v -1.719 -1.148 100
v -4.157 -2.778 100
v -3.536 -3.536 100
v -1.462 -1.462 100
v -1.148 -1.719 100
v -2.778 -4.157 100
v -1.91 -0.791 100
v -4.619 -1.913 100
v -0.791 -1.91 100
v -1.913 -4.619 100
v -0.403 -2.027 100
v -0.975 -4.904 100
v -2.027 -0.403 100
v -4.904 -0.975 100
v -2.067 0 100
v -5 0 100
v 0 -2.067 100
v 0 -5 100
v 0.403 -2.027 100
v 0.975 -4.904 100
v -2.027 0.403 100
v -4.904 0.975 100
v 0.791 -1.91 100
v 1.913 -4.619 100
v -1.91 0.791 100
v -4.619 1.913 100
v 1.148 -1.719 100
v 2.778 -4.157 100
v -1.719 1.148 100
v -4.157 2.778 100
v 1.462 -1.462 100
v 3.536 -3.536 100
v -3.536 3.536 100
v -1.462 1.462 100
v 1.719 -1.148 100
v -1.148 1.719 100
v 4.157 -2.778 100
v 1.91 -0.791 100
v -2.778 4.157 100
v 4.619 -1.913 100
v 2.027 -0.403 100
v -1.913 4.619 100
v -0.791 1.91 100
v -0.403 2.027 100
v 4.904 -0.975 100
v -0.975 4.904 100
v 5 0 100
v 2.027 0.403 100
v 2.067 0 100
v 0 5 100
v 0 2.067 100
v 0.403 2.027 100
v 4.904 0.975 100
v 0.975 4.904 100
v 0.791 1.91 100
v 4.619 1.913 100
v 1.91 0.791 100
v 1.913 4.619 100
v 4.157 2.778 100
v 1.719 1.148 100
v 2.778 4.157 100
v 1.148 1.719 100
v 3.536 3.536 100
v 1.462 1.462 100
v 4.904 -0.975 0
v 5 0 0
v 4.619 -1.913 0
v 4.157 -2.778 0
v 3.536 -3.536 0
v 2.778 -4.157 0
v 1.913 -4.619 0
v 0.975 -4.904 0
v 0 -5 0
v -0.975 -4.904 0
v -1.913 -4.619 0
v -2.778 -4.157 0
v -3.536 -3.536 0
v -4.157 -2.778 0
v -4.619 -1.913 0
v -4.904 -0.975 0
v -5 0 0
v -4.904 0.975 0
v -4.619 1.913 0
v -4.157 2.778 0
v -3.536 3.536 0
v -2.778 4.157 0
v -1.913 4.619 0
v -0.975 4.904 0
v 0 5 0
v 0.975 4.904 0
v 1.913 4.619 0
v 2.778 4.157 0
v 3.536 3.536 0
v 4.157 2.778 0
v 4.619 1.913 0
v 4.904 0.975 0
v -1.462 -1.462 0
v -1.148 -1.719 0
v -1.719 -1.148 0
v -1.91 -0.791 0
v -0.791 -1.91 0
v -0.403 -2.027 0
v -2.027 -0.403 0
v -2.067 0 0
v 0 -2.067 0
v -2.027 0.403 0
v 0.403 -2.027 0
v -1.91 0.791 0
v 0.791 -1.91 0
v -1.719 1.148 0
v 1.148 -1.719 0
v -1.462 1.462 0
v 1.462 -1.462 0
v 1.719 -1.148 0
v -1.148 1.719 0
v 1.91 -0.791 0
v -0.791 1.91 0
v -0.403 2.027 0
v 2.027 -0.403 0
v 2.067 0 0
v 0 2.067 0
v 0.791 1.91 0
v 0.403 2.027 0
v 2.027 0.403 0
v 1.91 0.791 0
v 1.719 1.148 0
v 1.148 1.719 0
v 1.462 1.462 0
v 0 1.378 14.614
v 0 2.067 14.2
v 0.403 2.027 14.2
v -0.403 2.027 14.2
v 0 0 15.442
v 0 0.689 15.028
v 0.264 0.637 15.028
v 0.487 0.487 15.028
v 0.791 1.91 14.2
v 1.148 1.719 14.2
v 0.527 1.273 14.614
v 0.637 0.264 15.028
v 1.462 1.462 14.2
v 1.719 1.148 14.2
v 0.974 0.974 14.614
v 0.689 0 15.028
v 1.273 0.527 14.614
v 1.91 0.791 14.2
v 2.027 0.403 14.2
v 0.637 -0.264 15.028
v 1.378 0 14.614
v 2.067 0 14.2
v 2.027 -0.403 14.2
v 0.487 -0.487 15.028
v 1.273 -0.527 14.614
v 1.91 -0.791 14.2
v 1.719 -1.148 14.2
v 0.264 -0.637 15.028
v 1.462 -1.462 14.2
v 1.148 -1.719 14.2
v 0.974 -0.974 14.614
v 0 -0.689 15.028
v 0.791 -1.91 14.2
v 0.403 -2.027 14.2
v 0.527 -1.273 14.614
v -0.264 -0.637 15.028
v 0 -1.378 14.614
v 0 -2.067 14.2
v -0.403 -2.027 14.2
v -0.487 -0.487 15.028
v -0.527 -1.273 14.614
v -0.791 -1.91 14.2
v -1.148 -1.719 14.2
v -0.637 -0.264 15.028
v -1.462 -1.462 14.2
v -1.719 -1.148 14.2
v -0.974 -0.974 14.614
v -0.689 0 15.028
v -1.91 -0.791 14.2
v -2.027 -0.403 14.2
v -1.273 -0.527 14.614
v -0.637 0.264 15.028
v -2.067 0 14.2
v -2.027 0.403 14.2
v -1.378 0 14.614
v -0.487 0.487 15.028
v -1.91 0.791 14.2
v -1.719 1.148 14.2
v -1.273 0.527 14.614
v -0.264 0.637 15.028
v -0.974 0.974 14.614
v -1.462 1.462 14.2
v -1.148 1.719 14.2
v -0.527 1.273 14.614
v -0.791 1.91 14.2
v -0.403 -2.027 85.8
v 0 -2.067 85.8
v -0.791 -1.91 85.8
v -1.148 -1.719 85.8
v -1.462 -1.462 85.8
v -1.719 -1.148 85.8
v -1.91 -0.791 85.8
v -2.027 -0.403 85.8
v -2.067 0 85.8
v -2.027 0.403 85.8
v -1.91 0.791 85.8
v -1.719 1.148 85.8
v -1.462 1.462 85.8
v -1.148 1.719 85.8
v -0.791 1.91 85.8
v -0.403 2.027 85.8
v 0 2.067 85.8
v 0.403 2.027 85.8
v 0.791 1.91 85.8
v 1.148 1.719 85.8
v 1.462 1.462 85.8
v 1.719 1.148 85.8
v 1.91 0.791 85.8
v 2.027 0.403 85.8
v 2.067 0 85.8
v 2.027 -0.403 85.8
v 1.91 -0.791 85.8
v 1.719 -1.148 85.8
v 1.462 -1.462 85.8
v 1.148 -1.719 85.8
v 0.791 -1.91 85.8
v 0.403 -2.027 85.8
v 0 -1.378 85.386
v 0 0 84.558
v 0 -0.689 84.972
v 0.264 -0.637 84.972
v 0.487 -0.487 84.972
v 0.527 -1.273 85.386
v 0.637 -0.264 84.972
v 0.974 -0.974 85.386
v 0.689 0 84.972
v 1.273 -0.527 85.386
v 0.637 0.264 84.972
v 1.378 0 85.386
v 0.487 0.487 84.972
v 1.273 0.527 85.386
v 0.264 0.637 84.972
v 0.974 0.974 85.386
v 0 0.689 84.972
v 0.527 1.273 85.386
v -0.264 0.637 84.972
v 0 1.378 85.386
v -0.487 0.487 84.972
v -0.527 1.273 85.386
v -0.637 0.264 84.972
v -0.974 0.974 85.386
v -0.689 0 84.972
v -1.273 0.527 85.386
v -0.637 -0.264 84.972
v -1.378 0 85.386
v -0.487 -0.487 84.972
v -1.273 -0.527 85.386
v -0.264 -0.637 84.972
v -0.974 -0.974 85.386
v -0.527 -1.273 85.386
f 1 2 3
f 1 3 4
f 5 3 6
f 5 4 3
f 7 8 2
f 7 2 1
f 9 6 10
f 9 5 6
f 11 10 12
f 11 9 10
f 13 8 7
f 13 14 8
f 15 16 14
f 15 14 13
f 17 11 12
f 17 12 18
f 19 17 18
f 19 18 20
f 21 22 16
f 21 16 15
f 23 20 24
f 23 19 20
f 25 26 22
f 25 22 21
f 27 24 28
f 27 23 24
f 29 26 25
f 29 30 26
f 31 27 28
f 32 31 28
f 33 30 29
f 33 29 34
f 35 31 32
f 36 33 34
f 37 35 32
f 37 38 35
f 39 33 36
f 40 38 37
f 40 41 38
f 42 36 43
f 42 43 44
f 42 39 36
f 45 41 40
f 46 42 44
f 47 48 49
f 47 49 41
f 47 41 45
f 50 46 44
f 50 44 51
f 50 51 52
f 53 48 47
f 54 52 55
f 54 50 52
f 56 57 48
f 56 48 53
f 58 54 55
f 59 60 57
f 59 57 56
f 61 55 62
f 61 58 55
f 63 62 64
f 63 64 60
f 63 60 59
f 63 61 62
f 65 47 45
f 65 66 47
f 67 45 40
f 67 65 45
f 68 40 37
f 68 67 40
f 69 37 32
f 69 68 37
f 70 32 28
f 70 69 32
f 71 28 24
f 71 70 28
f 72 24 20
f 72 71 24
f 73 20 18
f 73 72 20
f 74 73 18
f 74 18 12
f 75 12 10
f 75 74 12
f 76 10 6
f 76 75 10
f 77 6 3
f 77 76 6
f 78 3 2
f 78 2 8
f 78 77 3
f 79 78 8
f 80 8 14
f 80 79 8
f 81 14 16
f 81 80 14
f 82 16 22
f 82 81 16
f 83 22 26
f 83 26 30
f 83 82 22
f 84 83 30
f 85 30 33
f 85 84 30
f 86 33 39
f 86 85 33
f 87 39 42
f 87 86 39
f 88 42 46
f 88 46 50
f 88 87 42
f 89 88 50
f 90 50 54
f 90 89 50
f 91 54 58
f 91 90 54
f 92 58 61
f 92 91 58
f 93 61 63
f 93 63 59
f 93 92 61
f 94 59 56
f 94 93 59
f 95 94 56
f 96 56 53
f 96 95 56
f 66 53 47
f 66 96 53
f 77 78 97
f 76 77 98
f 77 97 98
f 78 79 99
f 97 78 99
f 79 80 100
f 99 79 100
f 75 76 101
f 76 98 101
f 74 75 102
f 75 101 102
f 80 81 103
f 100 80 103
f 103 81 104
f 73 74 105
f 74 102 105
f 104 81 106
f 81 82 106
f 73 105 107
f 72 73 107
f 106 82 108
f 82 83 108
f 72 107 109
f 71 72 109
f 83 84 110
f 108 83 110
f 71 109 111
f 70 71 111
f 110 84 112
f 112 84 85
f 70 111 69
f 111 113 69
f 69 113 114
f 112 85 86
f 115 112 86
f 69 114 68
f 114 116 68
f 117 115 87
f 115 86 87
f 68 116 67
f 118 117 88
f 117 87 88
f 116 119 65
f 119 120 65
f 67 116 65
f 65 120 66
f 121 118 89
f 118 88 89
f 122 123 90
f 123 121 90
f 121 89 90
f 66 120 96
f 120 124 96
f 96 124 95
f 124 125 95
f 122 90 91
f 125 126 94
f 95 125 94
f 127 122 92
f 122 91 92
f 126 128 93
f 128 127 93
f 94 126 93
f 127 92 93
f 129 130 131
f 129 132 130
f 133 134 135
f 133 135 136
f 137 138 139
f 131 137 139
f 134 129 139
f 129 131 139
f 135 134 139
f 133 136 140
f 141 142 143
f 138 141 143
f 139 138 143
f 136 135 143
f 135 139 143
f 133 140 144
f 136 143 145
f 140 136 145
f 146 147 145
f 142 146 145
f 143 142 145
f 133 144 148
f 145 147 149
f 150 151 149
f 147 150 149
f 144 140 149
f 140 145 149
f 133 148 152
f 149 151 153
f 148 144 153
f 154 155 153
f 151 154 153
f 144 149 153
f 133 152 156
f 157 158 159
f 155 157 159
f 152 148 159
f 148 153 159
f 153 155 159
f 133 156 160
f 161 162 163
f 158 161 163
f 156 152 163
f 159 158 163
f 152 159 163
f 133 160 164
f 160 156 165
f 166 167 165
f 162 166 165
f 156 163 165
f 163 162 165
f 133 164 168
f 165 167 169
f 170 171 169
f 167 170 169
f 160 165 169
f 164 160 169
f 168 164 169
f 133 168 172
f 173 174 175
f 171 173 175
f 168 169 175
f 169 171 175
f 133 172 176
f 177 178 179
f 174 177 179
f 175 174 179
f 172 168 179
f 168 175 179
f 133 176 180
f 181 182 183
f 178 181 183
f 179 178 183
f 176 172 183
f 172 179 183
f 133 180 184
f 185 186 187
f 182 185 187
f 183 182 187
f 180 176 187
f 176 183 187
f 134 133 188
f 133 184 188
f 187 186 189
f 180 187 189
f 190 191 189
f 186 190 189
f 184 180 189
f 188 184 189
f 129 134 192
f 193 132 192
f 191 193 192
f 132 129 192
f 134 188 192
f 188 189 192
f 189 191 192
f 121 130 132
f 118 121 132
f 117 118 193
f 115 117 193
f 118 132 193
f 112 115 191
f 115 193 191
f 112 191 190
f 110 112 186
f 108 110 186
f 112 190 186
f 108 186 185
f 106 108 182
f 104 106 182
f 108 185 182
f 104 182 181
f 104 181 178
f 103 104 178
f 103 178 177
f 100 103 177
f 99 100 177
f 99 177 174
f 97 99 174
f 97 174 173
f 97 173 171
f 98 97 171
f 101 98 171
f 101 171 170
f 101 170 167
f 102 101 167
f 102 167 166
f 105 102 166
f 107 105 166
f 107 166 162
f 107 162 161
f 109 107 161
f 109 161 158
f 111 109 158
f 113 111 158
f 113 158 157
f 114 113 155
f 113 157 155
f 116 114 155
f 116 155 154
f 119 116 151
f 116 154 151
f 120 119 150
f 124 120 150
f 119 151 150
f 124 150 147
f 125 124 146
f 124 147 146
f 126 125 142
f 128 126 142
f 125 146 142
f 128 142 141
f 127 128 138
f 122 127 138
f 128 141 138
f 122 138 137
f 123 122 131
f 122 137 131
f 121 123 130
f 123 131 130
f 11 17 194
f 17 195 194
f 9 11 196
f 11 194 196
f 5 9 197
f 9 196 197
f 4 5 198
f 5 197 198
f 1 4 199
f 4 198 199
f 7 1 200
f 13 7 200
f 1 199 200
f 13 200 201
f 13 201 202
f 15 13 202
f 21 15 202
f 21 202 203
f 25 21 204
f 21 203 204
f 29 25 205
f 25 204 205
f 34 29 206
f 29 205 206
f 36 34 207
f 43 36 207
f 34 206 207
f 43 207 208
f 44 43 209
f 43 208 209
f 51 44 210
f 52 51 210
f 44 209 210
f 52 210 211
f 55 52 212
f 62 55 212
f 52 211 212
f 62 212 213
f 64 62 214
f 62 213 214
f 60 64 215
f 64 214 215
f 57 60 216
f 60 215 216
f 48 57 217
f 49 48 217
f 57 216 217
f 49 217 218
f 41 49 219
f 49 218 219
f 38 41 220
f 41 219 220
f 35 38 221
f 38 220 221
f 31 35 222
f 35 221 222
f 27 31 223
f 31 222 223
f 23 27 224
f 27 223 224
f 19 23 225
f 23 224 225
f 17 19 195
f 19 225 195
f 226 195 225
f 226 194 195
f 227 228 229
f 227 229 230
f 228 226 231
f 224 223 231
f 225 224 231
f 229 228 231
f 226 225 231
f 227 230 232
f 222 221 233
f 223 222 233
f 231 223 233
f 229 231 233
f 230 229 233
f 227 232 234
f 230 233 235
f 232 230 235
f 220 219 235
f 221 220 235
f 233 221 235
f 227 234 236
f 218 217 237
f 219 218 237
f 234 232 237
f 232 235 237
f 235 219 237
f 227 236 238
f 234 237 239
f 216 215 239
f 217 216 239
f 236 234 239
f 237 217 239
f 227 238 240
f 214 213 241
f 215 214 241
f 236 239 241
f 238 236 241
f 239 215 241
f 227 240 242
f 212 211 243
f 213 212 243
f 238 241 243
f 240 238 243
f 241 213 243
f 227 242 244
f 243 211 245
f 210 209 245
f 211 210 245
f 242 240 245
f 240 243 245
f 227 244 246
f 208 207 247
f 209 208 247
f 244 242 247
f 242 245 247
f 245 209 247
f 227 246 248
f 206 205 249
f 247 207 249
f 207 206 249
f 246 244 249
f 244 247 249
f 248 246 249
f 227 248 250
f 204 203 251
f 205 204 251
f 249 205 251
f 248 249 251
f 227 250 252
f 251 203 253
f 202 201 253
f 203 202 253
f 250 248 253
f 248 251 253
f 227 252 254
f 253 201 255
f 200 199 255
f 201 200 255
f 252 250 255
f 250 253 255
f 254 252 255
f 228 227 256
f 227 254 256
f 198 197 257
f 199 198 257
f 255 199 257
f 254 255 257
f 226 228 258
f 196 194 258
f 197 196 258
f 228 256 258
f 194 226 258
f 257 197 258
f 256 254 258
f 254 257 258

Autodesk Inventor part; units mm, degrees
ref_plane "YZ Plane" through (0, 0, 0) normal (1, 0, 0) x (0, 1, 0)
ref_plane "XZ Plane" through (0, 0, 0) normal (0, 1, 0) x (-1, 0, 0)
ref_plane "XY Plane" through (0, 0, 0) normal (0, 0, 1) x (1, 0, 0)
sketch "Skizze1" plane through (0, 0, 0) normal (0, 0, 1) x (1, 0, 0)
  line L0 (-7, 0) -> (7, 0) projected
  line L1 (0, -7) -> (0, 7) projected
  circle A0 centre (0, 0) radius 5
  dimension "d0" = 10
extrude "Extrusion1" add sketch "Skizze1" along normal blind 100
sketch "Skizze2" plane through (0, 0, 100) normal (0, 0, 1) x (1, 0, 0)
  point P0 (0, 0)
  point P1 (0, 0)
hole "Bohrung1" at (0, 0, 100) direction (0, 0, -1) diameter 4.134 depth 14.2 tip angle 118 thread size "M5x0.8" class "6H" standard "ISO Metric profile"
sketch "Skizze3" plane through (0, 0, 0) normal (0, 0, -1) x (-1, 0, 0)
  point P0 (0, 0)
  point P1 (-2.4827, -3.6773)
hole "Bohrung2" at (0, 0, 0) direction (0, 0, 1) diameter 4.134 depth 14.2 tip angle 118 thread size "M5x0.8" class "6H" standard "ISO Metric profile"
properties part number "24_0497_0014"
